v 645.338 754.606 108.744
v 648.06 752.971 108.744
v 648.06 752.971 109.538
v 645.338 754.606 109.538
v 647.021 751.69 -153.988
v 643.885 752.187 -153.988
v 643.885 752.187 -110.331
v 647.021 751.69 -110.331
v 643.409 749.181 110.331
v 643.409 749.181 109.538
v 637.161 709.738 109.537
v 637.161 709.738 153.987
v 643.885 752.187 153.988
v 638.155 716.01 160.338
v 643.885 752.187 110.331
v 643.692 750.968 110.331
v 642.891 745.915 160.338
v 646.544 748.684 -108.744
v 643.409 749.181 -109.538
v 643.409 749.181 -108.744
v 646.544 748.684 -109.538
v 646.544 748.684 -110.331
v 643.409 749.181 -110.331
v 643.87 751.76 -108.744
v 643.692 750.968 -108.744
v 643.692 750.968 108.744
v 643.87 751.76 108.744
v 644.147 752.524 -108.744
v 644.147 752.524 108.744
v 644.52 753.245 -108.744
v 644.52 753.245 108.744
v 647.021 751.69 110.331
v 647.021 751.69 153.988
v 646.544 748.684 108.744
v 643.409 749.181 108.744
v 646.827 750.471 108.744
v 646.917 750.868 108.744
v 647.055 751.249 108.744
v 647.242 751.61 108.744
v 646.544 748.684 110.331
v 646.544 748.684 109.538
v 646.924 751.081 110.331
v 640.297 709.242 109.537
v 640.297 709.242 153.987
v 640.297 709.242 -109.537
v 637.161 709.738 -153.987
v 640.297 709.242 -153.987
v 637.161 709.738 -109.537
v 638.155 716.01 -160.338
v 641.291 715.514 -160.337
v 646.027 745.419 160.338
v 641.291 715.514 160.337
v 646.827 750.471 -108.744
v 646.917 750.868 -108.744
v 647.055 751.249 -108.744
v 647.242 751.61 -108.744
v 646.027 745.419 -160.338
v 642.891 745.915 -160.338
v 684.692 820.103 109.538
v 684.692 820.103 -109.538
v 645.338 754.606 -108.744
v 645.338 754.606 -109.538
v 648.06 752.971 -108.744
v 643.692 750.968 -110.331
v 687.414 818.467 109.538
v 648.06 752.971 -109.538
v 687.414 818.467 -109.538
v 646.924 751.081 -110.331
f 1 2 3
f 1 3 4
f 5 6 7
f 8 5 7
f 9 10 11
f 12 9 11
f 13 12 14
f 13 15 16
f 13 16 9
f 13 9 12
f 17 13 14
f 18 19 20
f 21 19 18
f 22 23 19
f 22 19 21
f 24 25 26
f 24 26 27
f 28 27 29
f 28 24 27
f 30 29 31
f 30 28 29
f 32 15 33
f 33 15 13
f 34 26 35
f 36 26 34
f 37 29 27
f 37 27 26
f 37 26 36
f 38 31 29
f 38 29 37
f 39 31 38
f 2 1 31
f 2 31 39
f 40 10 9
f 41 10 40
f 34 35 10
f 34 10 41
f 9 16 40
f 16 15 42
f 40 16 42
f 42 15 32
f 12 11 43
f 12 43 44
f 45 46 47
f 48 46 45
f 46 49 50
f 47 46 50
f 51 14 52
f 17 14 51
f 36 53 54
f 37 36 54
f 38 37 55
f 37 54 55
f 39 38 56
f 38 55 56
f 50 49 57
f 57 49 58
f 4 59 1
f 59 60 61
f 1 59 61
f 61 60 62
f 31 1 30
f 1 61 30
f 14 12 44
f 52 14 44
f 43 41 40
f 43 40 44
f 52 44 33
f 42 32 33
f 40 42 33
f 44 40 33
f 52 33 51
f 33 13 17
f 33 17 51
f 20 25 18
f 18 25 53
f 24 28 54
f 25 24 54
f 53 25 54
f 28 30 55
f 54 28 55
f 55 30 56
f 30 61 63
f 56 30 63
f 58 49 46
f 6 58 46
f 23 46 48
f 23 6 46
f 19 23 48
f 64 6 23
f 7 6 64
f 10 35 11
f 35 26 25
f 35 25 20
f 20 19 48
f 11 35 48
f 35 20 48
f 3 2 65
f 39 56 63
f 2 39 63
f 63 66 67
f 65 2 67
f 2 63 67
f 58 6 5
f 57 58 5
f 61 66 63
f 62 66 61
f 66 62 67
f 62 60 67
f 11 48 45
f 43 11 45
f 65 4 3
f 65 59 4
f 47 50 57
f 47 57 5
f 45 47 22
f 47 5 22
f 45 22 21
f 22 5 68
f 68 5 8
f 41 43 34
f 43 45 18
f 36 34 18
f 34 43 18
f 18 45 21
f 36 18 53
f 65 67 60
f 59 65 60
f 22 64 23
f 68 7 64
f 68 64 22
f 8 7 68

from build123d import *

# Parameters (mm, degrees)
BOSS_EXTRUDE1_DEPTH      = 109.5375
BOSS_EXTRUDE1_DEPTH_BACK = 109.5375
SKETCH2_W                = 50.8
SKETCH2_H                = 42.97785953
BOSS_EXTRUDE2_DEPTH      = 3.175
CHAMFER1_SIZE            = 6.35
CONVERT_SOLID1_START     = -110.33125
CONVERT_SOLID1_DEPTH     = 220.6625
CONVERT_SOLID1_2_DEPTH   = 1.5875
CONVERT_SOLID1_START_2   = 108.74375
CONVERT_SOLID1_3_DEPTH   = 1.5875
CONVERT_SOLID1_START_3   = -108.74375
CONVERT_SOLID1_4_DEPTH   = 217.4875


# Read off the part's stored shape, not the designer's step: Convert-Solid1
with BuildPart() as part:
    # Sketch1 → Boss-Extrude1 (new, two sides: drawn at the far end of the back side and taken through both)
    with BuildSketch(Plane.XY.offset(-BOSS_EXTRUDE1_DEPTH_BACK)):
        Polygon((640.29736406, 709.2417051), (646.924037824, 751.080876614), (687.413907929, 818.467336674), (684.69240175, 820.102582562), (643.884672043, 752.187115289), (637.161453578, 709.738384527), align=None)
    extrude(amount=BOSS_EXTRUDE1_DEPTH + BOSS_EXTRUDE1_DEPTH_BACK)

    # Sketch2 → Boss-Extrude2 (add)
    with BuildSketch(Plane(origin=(511.908391779, -81.078324129, 0), x_dir=(0, 0, 1), z_dir=(-0.9876883405951397, 0.1564344650402187, 0))):
        with Locations((-134.9375, 822.16326817)):
            Rectangle(SKETCH2_W, SKETCH2_H)
        with Locations((134.9375, 822.16326817)):
            Rectangle(SKETCH2_W, SKETCH2_H)
    extrude(amount=-BOSS_EXTRUDE2_DEPTH)

    # Chamfer1
    chamfer1_edges = [part.edges().sort_by_distance(p)[0] for p in [
        (645.452627283, 751.938775576, -160.3375),
        (638.729408819, 709.490044814, -160.3375),
        (645.452627283, 751.938775576, 160.3375),
        (638.729408819, 709.490044814, 160.3375),
    ]]
    chamfer(chamfer1_edges, length=CHAMFER1_SIZE)

    # Convert-Solid1 outline → Convert-Solid1 (cut)
    with BuildSketch(Plane.XY.offset(CONVERT_SOLID1_START)):
        with BuildLine():
            Line((644.520391245, 753.245129714), (643.884672043, 752.187115289))
            Line((643.884672043, 752.187115289), (643.691582642, 750.967996791))
            ThreePointArc((643.691582642, 750.967996791), (643.996355462, 752.146465849), (644.520391245, 753.245129714))
        make_face()
    extrude(amount=CONVERT_SOLID1_DEPTH, mode=Mode.SUBTRACT)

    # Convert-Solid1 2 outline → Convert-Solid1 2 (cut)
    with BuildSketch(Plane.XY.offset(CONVERT_SOLID1_START)):
        with BuildLine():
            Line((647.241897425, 751.609883826), (648.059520369, 752.970636916))
            Line((648.059520369, 752.970636916), (645.338014189, 754.605882804))
            Line((645.338014189, 754.605882804), (644.520391245, 753.245129714))
            ThreePointArc((644.520391245, 753.245129714), (643.996355462, 752.146465849), (643.691582642, 750.967996791))
            Line((643.691582642, 750.967996791), (643.408575407, 749.181159432))
            Line((643.408575407, 749.181159432), (646.544485888, 748.684480005))
            Line((646.544485888, 748.684480005), (646.924037824, 751.080876614))
            Line((646.924037824, 751.080876614), (647.241897425, 751.609883826))
        make_face()
    extrude(amount=CONVERT_SOLID1_2_DEPTH, mode=Mode.SUBTRACT)

    # Convert-Solid1 3 outline → Convert-Solid1 3 (cut)
    with BuildSketch(Plane.XY.offset(CONVERT_SOLID1_START_2)):
        with BuildLine():
            Line((647.241897425, 751.609883826), (648.059520369, 752.970636916))
            Line((648.059520369, 752.970636916), (645.338014189, 754.605882804))
            Line((645.338014189, 754.605882804), (644.520391245, 753.245129714))
            ThreePointArc((644.520391245, 753.245129714), (643.996355462, 752.146465849), (643.691582642, 750.967996791))
            Line((643.691582642, 750.967996791), (643.408575407, 749.181159432))
            Line((643.408575407, 749.181159432), (646.544485888, 748.684480005))
            Line((646.544485888, 748.684480005), (646.924037824, 751.080876614))
            Line((646.924037824, 751.080876614), (647.241897425, 751.609883826))
        make_face()
    extrude(amount=CONVERT_SOLID1_3_DEPTH, mode=Mode.SUBTRACT)

    # Convert-Solid1 4 outline → Convert-Solid1 4 (add)
    with BuildSketch(Plane.XY.offset(CONVERT_SOLID1_START_3)):
        with BuildLine():
            ThreePointArc((646.827493123, 750.471317365), (646.979879533, 751.060551894), (647.241897425, 751.609883826))
            Line((647.241897425, 751.609883826), (646.924037824, 751.080876614))
            Line((646.924037824, 751.080876614), (646.827493123, 750.471317365))
        make_face()
    extrude(amount=CONVERT_SOLID1_4_DEPTH)


solid = part.part
